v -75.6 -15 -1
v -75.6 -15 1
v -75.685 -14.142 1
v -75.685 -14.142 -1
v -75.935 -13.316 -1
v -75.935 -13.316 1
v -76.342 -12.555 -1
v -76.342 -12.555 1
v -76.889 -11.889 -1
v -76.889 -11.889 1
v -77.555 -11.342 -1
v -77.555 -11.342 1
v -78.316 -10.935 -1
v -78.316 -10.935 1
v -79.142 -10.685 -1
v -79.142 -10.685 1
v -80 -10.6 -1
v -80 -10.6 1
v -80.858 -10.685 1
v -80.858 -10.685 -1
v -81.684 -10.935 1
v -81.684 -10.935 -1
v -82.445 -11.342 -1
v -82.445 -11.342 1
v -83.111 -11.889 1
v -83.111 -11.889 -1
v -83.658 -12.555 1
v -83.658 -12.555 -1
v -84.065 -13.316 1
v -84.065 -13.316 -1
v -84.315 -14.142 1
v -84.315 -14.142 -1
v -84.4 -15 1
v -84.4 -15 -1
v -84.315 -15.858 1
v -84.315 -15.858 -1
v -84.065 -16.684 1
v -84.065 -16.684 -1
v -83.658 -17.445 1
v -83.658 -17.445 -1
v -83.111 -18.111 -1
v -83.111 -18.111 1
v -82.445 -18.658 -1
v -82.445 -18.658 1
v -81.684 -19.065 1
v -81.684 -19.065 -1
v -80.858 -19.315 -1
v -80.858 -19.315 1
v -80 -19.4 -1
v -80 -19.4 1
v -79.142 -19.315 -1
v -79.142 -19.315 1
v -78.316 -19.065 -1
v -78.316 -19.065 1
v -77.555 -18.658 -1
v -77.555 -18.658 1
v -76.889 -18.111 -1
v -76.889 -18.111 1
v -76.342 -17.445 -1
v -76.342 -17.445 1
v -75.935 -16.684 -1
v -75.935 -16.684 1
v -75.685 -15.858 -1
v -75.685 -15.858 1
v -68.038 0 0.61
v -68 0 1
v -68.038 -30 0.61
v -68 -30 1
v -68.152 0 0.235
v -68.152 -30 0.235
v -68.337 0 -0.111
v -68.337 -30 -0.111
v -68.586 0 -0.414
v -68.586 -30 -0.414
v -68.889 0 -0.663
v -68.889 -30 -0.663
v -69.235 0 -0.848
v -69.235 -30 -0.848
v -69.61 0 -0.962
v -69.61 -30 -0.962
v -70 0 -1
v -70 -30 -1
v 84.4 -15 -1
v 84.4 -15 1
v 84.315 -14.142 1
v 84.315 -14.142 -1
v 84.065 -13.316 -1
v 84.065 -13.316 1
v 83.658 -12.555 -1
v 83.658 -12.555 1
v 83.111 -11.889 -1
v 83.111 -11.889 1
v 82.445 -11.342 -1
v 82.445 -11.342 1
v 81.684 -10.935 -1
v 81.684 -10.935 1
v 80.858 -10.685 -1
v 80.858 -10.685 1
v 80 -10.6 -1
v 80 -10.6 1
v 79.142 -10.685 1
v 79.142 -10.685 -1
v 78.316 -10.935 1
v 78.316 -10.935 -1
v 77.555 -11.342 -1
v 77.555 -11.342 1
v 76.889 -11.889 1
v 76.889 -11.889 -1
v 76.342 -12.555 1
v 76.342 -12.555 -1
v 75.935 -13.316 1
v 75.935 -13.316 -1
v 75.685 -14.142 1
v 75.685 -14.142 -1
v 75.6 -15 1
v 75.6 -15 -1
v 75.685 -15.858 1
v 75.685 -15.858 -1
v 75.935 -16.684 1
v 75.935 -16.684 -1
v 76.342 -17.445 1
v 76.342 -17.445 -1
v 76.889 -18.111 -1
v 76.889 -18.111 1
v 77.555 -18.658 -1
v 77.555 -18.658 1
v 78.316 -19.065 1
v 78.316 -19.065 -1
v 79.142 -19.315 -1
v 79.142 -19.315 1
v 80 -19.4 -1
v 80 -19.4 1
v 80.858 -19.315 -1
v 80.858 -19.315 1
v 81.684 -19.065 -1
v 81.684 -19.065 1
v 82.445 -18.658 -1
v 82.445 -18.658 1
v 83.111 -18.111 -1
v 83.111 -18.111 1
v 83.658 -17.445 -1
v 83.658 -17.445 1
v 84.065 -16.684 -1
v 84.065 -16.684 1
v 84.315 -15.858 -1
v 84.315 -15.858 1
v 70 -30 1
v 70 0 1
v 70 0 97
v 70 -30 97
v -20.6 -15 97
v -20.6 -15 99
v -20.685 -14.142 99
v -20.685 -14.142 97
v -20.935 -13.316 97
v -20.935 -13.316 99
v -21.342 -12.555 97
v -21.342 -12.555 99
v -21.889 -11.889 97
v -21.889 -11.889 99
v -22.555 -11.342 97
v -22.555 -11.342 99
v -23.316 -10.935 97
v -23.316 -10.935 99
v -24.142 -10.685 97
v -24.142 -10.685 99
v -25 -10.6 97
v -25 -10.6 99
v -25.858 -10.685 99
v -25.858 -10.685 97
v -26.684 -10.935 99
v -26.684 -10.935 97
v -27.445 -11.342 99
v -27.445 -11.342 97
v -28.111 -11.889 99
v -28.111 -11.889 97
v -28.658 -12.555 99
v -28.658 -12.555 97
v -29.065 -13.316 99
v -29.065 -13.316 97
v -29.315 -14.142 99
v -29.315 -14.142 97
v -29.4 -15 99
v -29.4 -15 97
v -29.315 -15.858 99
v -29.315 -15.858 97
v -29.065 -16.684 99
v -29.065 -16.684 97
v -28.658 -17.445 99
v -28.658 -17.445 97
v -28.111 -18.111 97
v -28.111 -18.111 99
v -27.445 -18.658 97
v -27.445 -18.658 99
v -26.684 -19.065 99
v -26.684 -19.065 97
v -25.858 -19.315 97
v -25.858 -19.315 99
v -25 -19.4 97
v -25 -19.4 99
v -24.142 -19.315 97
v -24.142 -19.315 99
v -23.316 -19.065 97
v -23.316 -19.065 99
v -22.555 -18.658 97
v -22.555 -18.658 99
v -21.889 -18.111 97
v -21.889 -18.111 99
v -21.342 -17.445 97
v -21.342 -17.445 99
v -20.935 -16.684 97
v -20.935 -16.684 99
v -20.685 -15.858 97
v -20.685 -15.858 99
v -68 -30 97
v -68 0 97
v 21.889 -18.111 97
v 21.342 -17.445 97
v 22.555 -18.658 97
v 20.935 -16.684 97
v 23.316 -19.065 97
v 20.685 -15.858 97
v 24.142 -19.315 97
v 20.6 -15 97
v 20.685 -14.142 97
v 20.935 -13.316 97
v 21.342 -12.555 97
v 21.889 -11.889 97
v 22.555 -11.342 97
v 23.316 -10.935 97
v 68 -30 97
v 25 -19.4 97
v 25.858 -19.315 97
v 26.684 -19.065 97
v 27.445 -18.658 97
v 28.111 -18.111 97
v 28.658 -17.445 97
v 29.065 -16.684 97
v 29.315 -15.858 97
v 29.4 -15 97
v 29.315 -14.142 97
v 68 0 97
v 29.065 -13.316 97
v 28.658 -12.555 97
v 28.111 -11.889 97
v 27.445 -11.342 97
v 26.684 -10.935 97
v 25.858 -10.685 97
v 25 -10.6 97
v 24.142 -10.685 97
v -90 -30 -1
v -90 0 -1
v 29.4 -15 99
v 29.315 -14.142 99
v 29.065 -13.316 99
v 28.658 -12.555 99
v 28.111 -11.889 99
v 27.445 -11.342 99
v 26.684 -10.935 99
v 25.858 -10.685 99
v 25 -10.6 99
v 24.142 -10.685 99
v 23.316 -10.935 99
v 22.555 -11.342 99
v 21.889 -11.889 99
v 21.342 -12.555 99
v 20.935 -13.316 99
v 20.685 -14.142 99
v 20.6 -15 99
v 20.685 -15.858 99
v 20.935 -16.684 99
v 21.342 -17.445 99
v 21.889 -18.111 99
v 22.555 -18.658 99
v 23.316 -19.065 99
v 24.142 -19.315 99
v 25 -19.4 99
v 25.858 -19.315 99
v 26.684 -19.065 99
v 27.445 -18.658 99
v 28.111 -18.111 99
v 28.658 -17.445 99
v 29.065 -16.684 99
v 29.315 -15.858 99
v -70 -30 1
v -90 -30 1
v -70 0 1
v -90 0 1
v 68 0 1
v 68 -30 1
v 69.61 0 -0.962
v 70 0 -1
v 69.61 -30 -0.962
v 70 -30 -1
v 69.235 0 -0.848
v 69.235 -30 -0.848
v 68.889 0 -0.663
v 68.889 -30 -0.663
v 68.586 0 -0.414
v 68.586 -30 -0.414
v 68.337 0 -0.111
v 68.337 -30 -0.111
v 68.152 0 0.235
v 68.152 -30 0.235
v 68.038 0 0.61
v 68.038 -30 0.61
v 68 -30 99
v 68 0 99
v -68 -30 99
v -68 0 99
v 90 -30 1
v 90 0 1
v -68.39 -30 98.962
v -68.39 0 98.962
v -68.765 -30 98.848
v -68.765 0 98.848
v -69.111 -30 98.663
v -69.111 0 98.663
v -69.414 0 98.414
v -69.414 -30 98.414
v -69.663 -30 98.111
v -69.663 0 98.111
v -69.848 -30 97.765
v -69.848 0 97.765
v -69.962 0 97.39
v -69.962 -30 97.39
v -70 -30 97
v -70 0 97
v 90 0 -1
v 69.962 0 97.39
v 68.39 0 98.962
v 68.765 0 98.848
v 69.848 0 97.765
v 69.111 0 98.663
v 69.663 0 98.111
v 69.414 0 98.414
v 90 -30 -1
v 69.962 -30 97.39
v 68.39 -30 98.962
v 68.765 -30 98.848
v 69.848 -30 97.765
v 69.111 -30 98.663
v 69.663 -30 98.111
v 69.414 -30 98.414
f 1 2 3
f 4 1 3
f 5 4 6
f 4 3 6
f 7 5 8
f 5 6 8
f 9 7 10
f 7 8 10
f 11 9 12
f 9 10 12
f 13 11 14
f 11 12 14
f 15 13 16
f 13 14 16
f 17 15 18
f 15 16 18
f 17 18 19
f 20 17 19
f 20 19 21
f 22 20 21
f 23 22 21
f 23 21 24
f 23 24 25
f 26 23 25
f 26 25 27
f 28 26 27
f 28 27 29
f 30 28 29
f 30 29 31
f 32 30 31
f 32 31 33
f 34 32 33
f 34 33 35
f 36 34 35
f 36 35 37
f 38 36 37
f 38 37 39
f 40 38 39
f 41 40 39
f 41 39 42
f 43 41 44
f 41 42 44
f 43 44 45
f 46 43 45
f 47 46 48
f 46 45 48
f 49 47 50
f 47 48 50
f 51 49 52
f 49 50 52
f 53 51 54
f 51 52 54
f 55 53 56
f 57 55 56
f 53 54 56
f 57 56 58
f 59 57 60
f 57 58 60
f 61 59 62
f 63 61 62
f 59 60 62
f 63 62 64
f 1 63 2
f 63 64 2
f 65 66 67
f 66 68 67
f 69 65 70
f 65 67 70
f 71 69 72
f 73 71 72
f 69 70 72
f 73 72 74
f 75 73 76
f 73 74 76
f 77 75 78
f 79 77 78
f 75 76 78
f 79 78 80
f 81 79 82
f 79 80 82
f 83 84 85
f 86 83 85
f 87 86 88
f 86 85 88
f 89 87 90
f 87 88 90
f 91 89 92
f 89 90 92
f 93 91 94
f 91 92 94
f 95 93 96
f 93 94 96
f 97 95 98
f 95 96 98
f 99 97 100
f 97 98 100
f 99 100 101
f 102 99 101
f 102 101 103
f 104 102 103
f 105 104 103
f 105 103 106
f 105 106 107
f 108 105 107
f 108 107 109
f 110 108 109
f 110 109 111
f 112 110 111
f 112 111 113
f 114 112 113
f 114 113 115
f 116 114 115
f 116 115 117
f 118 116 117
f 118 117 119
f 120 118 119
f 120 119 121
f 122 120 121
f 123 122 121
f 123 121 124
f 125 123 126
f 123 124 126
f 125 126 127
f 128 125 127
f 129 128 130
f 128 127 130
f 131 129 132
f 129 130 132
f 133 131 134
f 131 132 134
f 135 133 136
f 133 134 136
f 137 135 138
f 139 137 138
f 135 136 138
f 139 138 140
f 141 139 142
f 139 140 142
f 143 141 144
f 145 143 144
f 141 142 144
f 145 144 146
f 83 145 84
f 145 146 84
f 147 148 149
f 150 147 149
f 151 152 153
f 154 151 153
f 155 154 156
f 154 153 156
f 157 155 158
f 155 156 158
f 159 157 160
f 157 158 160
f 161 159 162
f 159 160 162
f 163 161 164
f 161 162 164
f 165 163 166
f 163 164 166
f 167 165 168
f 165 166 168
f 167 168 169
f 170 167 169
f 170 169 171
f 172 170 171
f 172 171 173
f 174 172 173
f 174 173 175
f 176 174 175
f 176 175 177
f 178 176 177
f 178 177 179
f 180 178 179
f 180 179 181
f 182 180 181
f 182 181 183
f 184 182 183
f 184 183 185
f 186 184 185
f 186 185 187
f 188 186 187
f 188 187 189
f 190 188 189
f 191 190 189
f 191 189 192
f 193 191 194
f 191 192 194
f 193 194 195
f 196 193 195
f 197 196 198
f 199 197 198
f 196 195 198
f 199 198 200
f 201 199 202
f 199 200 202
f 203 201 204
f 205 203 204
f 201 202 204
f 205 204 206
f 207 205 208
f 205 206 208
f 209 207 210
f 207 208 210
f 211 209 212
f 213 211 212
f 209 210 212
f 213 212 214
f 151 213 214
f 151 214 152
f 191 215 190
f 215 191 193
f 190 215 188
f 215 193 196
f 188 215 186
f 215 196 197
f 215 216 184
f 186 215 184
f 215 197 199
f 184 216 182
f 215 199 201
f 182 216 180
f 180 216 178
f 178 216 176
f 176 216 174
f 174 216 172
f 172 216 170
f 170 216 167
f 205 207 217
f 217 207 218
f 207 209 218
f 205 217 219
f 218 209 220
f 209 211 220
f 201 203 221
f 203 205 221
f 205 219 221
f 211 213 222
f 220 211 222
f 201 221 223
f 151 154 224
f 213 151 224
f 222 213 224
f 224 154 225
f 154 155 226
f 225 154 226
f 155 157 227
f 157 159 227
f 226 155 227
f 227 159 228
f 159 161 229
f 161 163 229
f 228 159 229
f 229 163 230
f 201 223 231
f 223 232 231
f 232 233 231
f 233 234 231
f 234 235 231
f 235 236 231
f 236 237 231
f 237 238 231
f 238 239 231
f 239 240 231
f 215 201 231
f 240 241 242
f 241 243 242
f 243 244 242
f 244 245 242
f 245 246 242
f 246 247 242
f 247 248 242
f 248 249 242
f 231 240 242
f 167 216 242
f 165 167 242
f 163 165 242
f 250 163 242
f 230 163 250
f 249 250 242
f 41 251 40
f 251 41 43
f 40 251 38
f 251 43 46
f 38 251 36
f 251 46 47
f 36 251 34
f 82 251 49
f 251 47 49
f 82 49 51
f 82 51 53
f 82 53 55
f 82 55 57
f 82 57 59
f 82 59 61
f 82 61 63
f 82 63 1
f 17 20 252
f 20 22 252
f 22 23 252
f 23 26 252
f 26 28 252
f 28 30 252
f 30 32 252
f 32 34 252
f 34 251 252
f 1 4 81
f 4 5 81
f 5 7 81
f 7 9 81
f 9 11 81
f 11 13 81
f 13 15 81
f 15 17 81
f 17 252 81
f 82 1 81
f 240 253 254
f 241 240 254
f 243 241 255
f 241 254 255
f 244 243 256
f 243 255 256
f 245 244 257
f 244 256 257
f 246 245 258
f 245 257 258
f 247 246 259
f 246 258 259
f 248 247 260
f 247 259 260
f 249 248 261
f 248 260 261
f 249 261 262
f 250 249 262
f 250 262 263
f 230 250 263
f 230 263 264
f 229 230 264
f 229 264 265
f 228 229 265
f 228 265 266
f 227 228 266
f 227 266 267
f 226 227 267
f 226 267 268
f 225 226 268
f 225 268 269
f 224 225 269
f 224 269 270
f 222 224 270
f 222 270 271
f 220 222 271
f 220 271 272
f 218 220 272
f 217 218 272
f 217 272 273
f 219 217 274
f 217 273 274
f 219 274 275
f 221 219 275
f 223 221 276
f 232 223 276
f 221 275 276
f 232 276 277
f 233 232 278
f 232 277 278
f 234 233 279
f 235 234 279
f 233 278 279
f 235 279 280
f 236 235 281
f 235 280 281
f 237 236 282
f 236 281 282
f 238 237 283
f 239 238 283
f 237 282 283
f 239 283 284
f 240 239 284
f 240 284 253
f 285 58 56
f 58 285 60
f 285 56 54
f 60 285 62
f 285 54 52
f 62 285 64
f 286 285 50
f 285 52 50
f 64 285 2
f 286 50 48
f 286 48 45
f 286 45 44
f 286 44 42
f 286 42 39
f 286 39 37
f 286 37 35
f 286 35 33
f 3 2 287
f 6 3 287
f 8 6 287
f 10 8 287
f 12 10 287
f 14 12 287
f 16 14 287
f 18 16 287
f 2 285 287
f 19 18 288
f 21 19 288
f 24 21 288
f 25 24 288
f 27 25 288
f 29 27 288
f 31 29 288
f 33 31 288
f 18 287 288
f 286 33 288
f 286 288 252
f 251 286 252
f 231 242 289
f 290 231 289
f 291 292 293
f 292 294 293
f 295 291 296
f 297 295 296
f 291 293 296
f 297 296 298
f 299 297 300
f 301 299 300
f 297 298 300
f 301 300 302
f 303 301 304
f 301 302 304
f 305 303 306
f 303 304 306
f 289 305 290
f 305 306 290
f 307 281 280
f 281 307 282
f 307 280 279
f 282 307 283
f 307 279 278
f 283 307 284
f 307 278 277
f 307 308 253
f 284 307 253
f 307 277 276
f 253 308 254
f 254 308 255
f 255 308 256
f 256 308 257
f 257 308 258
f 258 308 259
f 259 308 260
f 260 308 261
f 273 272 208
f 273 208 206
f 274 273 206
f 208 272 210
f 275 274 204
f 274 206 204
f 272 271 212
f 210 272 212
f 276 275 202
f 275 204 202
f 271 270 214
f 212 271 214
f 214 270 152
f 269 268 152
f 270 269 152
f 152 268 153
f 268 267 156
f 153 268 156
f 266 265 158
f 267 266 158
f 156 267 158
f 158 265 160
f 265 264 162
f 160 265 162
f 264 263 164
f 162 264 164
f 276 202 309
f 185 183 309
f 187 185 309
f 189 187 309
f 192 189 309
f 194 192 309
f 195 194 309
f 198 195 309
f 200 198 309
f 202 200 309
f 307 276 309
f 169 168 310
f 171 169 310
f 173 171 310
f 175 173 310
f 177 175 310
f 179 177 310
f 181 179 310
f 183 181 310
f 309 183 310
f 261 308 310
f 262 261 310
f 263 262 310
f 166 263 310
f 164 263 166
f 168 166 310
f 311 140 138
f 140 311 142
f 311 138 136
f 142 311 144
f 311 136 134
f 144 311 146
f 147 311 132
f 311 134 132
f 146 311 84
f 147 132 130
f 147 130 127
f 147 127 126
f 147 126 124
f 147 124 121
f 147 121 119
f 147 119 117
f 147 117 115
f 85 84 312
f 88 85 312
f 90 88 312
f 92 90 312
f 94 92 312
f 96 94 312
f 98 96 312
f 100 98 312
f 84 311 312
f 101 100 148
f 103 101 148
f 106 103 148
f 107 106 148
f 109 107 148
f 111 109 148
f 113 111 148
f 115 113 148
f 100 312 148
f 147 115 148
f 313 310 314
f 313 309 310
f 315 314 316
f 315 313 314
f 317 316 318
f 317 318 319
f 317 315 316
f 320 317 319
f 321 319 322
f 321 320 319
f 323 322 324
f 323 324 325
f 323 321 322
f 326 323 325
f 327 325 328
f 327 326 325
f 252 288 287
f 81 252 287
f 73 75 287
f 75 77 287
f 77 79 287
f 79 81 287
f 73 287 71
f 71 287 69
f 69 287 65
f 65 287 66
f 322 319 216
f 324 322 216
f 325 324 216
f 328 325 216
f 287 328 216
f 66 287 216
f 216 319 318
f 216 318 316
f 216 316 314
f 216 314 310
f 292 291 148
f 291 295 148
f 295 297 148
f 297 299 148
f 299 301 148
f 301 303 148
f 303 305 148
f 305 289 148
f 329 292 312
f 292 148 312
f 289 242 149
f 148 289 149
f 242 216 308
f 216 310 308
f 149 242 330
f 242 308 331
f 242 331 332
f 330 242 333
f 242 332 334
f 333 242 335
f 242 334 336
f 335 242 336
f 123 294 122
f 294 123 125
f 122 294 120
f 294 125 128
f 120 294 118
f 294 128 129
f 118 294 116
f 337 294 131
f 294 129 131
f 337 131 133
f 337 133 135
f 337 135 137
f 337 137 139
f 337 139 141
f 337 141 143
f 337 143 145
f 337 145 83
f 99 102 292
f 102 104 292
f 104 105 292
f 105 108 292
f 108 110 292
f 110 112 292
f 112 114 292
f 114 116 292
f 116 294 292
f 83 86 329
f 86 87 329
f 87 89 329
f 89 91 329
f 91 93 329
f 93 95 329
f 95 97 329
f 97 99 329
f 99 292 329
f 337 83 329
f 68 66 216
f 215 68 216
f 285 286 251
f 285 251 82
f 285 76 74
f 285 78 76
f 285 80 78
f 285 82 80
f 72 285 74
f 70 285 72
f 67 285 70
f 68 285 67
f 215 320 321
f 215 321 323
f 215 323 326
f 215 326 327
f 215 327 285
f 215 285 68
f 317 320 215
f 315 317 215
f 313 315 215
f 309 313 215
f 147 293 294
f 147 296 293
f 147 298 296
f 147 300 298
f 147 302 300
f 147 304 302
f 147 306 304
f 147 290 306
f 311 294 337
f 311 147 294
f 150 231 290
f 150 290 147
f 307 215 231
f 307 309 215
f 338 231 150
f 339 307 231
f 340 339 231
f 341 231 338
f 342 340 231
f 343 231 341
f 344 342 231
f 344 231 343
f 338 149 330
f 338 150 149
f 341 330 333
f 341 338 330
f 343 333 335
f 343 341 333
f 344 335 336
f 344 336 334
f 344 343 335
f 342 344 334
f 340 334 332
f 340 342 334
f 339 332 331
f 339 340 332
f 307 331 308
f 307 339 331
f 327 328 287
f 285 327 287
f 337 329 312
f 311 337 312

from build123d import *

# Parameters (mm, degrees)
F1_DEPTH = 30
F2_R     = 4.4
F3_R     = 4.4
F4_DEPTH = 25
F5_R     = 2
F6_R     = 2


# Not quite as in the source:
# - a feature names something its author has since deleted; it is built from what else it names


with BuildPart() as f1:
    # F0 (on Front) → F1 (new body)
    with BuildSketch(Plane.XZ):
        Polygon((90, -1), (90, 1), (70, 1), (70, 99), (-70, 99), (-70, 1), (-90, 1), (-90, -1), (-68, -1), (-68, 97), (68, 97), (68, -1), align=None)
    extrude(amount=F1_DEPTH)

    # F2 (on face) + F3 (on face) → F4 (cut)
    with BuildSketch(Plane.XY.offset(1)):
        with Locations((-80, -15)):
            Circle(F2_R)
        with Locations((80, -15)):
            Circle(F2_R)
    with BuildSketch(Plane.XY.offset(99)):
        with Locations((-25, -15)):
            Circle(F3_R)
        with Locations((25, -15)):
            Circle(F3_R)
    extrude(amount=-F4_DEPTH, mode=Mode.SUBTRACT)

    # F5
    f5_edges = [f1.edges().sort_by_distance(p)[0] for p in [
        (-70, -15, 99),
        (70, -15, 99),
    ]]
    fillet(f5_edges, radius=F5_R)

    # F6
    f6_edges = [f1.edges().sort_by_distance(p)[0] for p in [
        (68, -15, -1),
        (-68, -15, -1),
    ]]
    fillet(f6_edges, radius=F6_R)


solid = f1.part
